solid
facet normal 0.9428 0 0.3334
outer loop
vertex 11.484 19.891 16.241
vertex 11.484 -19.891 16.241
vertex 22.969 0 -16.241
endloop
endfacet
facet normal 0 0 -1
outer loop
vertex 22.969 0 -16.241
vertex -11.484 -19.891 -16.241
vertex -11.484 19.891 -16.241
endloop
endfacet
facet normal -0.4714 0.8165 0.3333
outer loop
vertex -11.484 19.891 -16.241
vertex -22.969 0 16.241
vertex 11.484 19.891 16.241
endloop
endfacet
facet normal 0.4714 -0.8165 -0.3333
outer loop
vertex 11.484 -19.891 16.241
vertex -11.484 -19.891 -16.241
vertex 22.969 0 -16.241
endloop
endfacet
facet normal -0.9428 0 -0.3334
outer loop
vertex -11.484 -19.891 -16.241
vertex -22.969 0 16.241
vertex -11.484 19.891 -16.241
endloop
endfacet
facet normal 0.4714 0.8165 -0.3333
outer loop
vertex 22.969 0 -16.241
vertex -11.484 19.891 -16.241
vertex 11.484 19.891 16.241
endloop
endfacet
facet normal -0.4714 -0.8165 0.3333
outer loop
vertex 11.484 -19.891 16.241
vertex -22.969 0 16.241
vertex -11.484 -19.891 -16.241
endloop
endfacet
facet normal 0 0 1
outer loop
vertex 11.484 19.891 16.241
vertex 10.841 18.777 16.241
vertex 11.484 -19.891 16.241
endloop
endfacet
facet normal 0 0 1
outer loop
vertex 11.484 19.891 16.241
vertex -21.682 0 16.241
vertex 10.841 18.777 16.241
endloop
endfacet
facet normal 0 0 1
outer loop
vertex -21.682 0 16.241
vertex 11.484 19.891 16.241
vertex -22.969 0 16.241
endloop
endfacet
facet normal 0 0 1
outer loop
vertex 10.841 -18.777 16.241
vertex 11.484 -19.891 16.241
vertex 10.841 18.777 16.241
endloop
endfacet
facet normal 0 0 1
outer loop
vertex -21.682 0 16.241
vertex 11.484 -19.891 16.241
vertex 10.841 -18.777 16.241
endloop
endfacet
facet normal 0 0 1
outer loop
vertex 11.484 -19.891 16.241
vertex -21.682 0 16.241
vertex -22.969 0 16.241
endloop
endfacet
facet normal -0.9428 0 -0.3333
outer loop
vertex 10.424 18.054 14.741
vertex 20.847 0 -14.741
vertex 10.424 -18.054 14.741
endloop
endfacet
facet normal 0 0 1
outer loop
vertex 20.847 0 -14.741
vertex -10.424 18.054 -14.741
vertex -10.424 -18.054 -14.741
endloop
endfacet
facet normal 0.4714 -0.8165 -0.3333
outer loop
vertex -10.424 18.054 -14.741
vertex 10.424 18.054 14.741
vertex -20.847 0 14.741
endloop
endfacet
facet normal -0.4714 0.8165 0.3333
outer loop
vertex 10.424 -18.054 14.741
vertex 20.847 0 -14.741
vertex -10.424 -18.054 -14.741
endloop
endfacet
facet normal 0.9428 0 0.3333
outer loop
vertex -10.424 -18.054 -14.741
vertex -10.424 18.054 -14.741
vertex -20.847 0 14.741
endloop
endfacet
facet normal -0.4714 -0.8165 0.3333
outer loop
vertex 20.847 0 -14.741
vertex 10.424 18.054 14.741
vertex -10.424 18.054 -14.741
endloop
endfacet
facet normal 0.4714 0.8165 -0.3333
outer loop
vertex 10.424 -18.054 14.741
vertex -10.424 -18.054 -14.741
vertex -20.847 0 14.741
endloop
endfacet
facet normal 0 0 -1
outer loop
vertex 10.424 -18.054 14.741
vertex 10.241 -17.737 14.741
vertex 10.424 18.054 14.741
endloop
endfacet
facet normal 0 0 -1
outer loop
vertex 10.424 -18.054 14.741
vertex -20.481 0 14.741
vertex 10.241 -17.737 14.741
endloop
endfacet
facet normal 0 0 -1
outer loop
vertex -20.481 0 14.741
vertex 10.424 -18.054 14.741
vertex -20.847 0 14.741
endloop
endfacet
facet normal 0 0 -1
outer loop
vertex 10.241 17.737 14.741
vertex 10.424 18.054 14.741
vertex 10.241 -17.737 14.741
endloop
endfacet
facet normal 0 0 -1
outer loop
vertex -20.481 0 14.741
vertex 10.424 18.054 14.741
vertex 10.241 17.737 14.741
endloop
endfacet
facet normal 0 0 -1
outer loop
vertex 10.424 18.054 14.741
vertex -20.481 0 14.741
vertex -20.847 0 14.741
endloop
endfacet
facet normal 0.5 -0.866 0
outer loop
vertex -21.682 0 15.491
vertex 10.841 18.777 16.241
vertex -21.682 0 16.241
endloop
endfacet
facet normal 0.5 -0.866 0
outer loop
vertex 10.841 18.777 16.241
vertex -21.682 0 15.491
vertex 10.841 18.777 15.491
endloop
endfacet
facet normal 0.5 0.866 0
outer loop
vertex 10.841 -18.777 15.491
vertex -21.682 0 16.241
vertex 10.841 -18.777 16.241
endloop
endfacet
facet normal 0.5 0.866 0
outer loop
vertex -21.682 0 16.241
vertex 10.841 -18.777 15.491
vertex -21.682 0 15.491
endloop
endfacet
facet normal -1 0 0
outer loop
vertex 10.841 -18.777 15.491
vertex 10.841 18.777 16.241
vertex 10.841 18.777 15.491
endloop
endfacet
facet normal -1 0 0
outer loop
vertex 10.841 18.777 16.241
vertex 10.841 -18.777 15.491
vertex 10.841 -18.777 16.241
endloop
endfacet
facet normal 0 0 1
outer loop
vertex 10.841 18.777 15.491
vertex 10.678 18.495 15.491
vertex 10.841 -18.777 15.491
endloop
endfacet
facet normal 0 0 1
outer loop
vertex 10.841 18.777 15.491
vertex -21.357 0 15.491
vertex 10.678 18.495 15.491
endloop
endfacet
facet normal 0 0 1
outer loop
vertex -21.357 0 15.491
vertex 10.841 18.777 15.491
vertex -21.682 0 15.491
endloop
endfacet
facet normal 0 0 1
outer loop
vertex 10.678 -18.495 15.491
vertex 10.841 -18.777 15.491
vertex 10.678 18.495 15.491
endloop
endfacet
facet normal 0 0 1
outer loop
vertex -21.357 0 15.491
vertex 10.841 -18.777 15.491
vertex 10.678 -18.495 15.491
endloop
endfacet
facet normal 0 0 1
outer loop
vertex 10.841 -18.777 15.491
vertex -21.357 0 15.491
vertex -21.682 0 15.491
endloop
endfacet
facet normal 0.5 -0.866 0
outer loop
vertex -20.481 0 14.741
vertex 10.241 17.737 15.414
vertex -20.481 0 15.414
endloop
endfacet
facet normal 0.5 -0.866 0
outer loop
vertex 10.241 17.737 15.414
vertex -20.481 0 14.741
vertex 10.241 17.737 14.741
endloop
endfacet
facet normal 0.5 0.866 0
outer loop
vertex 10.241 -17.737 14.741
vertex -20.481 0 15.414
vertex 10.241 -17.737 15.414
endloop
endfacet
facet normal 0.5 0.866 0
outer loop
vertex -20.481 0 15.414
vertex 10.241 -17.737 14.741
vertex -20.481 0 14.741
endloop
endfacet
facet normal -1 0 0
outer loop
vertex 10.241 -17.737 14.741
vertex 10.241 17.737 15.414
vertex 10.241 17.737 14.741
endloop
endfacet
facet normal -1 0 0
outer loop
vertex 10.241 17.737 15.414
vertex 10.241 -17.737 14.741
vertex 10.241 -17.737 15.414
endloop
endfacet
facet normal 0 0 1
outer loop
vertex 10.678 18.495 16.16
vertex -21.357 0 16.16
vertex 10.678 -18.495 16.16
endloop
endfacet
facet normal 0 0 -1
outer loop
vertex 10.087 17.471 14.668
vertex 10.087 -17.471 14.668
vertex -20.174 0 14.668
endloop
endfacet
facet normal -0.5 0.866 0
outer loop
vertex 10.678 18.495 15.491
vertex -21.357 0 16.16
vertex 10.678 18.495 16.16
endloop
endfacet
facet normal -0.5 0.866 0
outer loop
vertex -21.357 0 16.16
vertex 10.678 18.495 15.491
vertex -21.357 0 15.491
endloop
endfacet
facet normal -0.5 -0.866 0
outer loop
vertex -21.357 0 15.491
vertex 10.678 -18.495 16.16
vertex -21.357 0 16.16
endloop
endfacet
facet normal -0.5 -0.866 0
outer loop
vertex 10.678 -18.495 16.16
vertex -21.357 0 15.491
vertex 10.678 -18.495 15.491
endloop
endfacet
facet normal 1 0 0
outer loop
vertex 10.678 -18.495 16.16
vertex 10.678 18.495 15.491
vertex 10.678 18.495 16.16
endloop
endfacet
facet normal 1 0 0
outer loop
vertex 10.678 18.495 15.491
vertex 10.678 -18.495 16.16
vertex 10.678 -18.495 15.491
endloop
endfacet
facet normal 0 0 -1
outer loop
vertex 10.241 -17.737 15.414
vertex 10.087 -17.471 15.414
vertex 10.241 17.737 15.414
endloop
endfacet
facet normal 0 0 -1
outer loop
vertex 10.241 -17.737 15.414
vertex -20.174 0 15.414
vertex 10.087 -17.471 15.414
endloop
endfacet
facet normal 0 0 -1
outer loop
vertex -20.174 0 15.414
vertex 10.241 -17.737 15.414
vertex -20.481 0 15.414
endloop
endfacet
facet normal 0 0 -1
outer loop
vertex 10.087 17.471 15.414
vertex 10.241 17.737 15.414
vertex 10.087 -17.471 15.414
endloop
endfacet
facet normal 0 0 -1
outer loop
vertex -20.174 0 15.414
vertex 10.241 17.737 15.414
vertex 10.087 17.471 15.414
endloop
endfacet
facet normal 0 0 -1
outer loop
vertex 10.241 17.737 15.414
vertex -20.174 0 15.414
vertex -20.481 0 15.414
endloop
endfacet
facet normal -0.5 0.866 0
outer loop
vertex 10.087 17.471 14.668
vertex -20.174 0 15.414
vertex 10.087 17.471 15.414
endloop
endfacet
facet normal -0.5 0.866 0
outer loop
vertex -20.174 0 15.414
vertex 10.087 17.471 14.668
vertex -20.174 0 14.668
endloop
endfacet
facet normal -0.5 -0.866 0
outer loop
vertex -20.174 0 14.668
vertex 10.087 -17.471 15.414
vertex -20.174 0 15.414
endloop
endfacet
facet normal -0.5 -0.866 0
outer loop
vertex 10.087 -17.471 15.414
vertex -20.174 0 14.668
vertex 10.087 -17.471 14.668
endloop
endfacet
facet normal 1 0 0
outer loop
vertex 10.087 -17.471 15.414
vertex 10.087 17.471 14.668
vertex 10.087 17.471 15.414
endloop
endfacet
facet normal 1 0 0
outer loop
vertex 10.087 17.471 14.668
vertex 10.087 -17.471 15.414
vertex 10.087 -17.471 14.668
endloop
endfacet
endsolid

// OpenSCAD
arete = 39.783;
paroi = 1.5;
echelleReductionAjustementBouchon = 0.985;
r = 0.19; // résolution d'impression sur l'axe Z
octa_sch = [3,4];
Cpi = 3.14159;
Cphi = (1+sqrt(5))/2;
Cepsilon = 0.00000001;

function octa_ext_radius(a) = 
    a/2*(sqrt(2));
    
function octa_int_radius(a) = 
    a/6*sqrt(6);
    
function octa_arete_from(radius) = 
    radius*6/sqrt(6);
    
externalRadius = octa_ext_radius(arete);
internalRadius = octa_ext_radius( 
                    octa_arete_from(
                        octa_int_radius(arete)-paroi));
                        
echo(externalRadius); 
echo(internalRadius);

//octahedron(arete);
//octa_creux();
//decoupe_bouchon();
corps_ouvert();
bouchon();
//trou();

module corps_ouvert() {
	difference() {
		octa_creux();
		decoupe_bouchon();
	}
}

module bouchon() {
    //rotate([180, 0, 0])
	scale([echelleReductionAjustementBouchon, echelleReductionAjustementBouchon, 0.995])
	difference () {
        intersection() {
            octa_creux();
            decoupe_bouchon(echelleReductionAjustementBouchon);
        }
	}
}

module octa_creux() {
	difference() {
        octahedron(externalRadius);
        octahedron(internalRadius);
	}
}

module decoupe_bouchon(scale=1) {
    distance = octa_int_radius(arete);
	rotate([0,0,60]) translate([0,0, distance])
		cylinder(paroi, r=arete*0.545, $fn=3, center=true);
	rotate([0,0,60]) translate([0,0, distance-paroi])
		cylinder(paroi, r=(arete-paroi)*0.535, $fn=3, center=true);
}


module octahedron(rad) {
    // create an instance of a spherical coordinate
    // long - rotation around z -axis
    // lat - latitude, starting at 0 == 'north pole'
    // rad - distance from center
    function sph(long, lat, rad=1) = [long, lat, rad];
    
    // Convert spherical to cartesian
    function sph_to_cart(s) = [
	clean(s[2]*sin(s[1])*cos(s[0])),  

	clean(s[2]*sin(s[1])*sin(s[0])),

	clean(s[2]*cos(s[1]))
	];

    function sphu_from_cart(c, rad=1) = sph(
        atan2(c[1],c[0]), 
        atan2(sqrt(c[0]*c[0]+c[1]*c[1]), c[2]), 
        rad
        );

    octa_cart = [
        [+1, 0, 0],  // + x axis
        [-1, 0, 0],	// - x axis
        [0, +1, 0],	// + y axis
        [0, -1, 0],	// - y axis
        [0, 0, +1],	// + z axis
        [0, 0, -1] 	// - z axis
    ];

    function octa_unit(rad=1) = [
        sph_to_cart(sphu_from_cart(octa_cart[0], rad)), 
        sph_to_cart(sphu_from_cart(octa_cart[1], rad)),
        sph_to_cart(sphu_from_cart(octa_cart[2], rad)),
        sph_to_cart(sphu_from_cart(octa_cart[3], rad)),
        sph_to_cart(sphu_from_cart(octa_cart[4], rad)), 
        sph_to_cart(sphu_from_cart(octa_cart[5], rad)), 
        ];

    octafaces = [
        [4,2,0],
        [4,0,3],
        [4,3,1],
        [4,1,2],
        [5,0,2],
        [5,3,0],
        [5,1,3],
        [5,2,1]
        ];

    octa_edges = [
        [0,2], 
        [0,3],
        [0,4],
        [0,5],
        [1,2],
        [1,3],
        [1,4],
        [1,5],
        [2,4], 
        [2,5],
        [3,4],
        [3,5],
        ];

    function octahedron(rad=1) = [octa_unit(rad), octafaces, octa_edges];

    rotate([0, 90-plat_dihedral(octa_sch)/2, 0])
    rotate([45, 0, 0])
    polyhedron(octa_unit(rad), faces=octafaces);
}
//translate([0, 0, -17.7])
//cylinder(5,40,40);

function clean(n) = (n < 0) ? ((n < -Cepsilon) ? n : 0) : 
	(n < Cepsilon) ? 0 : n; 

function plat_dihedral(pq) = 2 * asin( cos(180/pq[1])/sin(180/pq[0]));

function plat_circumradius(pq, a) = 
	(a/2)*
	tan(Cpi/pq[1])*
	tan(plat_dihedral(pq)/2);

function plat_midradius(pq, a) = 
	(a/2)*
	cos(Cpi/pq[0])*
	tan(plat_dihedral(pq)/2);

function plat_inradius(pq,a) = 
	a/(2*tan(Cpi/pq[0]))*
	sqrt((1-cos(plat_dihedral(pq)))/(1+cos(plat_dihedral(pq))));

function plat_a_from_inradius(pq, inradius) =
    inradius*(2*tan(Cpi/pq[0]))/
	sqrt((1-cos(plat_dihedral(pq)))/(1+cos(plat_dihedral(pq))));
